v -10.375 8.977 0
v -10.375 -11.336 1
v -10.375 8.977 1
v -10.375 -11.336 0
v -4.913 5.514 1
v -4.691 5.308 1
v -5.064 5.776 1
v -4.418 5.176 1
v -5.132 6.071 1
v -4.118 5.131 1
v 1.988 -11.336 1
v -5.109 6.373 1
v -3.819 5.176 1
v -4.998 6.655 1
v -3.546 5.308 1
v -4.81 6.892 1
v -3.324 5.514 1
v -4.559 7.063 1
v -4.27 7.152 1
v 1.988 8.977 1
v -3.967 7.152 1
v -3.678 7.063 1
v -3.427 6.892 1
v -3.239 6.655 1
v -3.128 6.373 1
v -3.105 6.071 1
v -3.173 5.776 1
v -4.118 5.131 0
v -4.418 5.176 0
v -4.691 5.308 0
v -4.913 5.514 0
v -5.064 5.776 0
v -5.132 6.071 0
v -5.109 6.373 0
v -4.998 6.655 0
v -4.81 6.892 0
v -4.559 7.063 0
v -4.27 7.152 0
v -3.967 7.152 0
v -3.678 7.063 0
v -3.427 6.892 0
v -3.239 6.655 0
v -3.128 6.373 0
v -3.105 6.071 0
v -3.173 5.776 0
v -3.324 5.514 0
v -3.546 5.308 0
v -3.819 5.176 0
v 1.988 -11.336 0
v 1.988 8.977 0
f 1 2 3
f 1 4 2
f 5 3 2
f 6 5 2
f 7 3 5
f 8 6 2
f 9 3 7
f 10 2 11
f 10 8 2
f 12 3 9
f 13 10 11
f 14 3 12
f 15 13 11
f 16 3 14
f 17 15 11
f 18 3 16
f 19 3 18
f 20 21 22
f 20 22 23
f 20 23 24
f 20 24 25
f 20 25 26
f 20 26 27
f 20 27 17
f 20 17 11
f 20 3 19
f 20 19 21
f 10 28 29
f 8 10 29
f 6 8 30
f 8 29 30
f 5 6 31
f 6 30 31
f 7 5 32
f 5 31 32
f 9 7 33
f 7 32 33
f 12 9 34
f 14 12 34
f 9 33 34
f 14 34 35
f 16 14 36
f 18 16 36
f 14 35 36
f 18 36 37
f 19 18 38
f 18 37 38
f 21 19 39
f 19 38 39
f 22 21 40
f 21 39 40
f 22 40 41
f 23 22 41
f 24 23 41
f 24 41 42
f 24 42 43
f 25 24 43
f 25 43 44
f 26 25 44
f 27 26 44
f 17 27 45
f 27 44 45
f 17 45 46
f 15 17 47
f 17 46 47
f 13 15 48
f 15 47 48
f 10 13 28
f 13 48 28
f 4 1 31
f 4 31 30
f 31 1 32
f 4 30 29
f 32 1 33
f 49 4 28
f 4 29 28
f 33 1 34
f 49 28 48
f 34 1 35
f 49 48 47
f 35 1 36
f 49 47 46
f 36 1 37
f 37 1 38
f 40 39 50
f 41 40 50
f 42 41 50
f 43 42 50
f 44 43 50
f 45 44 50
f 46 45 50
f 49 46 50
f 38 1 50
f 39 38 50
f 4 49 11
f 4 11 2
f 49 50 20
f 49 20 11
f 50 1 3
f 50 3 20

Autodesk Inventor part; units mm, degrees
ref_plane "YZ Plane" through (0, 0, 0) normal (1, 0, 0) x (0, 1, 0)
ref_plane "XZ Plane" through (0, 0, 0) normal (0, 1, 0) x (-1, 0, 0)
ref_plane "XY Plane" through (0, 0, 0) normal (0, 0, 1) x (1, 0, 0)
sketch "Sketch1" plane through (0, 0, 0) normal (0, 0, 1) x (1, 0, 0)
  line L0 (-10.3751, 8.9772) -> (1.9877, 8.9772)
  line L1 (1.9877, 8.9772) -> (1.9877, -11.3362)
  line L2 (1.9877, -11.3362) -> (-10.3751, -11.3362)
  line L3 (-10.3751, -11.3362) -> (-10.3751, 8.9772)
  point P0 (0, 0)
extrude "Extrusion1" add sketch "Sketch1" along normal blind 1
sketch "Sketch2" plane through (0, 0, 1) normal (0, 0, 1) x (1, 0, 0)
  point P0 (0, 0)
  point P1 (-4.1185, 6.1473)
hole "Hole1" at (-4.1185, 6.1473, 1) direction (0, 0, -1) diameter 2.032 end through all clearance for "Flat Head Machine Screw (82)" size "#0" standard "Ansi Unified Screw Threads"
properties part number "side"
